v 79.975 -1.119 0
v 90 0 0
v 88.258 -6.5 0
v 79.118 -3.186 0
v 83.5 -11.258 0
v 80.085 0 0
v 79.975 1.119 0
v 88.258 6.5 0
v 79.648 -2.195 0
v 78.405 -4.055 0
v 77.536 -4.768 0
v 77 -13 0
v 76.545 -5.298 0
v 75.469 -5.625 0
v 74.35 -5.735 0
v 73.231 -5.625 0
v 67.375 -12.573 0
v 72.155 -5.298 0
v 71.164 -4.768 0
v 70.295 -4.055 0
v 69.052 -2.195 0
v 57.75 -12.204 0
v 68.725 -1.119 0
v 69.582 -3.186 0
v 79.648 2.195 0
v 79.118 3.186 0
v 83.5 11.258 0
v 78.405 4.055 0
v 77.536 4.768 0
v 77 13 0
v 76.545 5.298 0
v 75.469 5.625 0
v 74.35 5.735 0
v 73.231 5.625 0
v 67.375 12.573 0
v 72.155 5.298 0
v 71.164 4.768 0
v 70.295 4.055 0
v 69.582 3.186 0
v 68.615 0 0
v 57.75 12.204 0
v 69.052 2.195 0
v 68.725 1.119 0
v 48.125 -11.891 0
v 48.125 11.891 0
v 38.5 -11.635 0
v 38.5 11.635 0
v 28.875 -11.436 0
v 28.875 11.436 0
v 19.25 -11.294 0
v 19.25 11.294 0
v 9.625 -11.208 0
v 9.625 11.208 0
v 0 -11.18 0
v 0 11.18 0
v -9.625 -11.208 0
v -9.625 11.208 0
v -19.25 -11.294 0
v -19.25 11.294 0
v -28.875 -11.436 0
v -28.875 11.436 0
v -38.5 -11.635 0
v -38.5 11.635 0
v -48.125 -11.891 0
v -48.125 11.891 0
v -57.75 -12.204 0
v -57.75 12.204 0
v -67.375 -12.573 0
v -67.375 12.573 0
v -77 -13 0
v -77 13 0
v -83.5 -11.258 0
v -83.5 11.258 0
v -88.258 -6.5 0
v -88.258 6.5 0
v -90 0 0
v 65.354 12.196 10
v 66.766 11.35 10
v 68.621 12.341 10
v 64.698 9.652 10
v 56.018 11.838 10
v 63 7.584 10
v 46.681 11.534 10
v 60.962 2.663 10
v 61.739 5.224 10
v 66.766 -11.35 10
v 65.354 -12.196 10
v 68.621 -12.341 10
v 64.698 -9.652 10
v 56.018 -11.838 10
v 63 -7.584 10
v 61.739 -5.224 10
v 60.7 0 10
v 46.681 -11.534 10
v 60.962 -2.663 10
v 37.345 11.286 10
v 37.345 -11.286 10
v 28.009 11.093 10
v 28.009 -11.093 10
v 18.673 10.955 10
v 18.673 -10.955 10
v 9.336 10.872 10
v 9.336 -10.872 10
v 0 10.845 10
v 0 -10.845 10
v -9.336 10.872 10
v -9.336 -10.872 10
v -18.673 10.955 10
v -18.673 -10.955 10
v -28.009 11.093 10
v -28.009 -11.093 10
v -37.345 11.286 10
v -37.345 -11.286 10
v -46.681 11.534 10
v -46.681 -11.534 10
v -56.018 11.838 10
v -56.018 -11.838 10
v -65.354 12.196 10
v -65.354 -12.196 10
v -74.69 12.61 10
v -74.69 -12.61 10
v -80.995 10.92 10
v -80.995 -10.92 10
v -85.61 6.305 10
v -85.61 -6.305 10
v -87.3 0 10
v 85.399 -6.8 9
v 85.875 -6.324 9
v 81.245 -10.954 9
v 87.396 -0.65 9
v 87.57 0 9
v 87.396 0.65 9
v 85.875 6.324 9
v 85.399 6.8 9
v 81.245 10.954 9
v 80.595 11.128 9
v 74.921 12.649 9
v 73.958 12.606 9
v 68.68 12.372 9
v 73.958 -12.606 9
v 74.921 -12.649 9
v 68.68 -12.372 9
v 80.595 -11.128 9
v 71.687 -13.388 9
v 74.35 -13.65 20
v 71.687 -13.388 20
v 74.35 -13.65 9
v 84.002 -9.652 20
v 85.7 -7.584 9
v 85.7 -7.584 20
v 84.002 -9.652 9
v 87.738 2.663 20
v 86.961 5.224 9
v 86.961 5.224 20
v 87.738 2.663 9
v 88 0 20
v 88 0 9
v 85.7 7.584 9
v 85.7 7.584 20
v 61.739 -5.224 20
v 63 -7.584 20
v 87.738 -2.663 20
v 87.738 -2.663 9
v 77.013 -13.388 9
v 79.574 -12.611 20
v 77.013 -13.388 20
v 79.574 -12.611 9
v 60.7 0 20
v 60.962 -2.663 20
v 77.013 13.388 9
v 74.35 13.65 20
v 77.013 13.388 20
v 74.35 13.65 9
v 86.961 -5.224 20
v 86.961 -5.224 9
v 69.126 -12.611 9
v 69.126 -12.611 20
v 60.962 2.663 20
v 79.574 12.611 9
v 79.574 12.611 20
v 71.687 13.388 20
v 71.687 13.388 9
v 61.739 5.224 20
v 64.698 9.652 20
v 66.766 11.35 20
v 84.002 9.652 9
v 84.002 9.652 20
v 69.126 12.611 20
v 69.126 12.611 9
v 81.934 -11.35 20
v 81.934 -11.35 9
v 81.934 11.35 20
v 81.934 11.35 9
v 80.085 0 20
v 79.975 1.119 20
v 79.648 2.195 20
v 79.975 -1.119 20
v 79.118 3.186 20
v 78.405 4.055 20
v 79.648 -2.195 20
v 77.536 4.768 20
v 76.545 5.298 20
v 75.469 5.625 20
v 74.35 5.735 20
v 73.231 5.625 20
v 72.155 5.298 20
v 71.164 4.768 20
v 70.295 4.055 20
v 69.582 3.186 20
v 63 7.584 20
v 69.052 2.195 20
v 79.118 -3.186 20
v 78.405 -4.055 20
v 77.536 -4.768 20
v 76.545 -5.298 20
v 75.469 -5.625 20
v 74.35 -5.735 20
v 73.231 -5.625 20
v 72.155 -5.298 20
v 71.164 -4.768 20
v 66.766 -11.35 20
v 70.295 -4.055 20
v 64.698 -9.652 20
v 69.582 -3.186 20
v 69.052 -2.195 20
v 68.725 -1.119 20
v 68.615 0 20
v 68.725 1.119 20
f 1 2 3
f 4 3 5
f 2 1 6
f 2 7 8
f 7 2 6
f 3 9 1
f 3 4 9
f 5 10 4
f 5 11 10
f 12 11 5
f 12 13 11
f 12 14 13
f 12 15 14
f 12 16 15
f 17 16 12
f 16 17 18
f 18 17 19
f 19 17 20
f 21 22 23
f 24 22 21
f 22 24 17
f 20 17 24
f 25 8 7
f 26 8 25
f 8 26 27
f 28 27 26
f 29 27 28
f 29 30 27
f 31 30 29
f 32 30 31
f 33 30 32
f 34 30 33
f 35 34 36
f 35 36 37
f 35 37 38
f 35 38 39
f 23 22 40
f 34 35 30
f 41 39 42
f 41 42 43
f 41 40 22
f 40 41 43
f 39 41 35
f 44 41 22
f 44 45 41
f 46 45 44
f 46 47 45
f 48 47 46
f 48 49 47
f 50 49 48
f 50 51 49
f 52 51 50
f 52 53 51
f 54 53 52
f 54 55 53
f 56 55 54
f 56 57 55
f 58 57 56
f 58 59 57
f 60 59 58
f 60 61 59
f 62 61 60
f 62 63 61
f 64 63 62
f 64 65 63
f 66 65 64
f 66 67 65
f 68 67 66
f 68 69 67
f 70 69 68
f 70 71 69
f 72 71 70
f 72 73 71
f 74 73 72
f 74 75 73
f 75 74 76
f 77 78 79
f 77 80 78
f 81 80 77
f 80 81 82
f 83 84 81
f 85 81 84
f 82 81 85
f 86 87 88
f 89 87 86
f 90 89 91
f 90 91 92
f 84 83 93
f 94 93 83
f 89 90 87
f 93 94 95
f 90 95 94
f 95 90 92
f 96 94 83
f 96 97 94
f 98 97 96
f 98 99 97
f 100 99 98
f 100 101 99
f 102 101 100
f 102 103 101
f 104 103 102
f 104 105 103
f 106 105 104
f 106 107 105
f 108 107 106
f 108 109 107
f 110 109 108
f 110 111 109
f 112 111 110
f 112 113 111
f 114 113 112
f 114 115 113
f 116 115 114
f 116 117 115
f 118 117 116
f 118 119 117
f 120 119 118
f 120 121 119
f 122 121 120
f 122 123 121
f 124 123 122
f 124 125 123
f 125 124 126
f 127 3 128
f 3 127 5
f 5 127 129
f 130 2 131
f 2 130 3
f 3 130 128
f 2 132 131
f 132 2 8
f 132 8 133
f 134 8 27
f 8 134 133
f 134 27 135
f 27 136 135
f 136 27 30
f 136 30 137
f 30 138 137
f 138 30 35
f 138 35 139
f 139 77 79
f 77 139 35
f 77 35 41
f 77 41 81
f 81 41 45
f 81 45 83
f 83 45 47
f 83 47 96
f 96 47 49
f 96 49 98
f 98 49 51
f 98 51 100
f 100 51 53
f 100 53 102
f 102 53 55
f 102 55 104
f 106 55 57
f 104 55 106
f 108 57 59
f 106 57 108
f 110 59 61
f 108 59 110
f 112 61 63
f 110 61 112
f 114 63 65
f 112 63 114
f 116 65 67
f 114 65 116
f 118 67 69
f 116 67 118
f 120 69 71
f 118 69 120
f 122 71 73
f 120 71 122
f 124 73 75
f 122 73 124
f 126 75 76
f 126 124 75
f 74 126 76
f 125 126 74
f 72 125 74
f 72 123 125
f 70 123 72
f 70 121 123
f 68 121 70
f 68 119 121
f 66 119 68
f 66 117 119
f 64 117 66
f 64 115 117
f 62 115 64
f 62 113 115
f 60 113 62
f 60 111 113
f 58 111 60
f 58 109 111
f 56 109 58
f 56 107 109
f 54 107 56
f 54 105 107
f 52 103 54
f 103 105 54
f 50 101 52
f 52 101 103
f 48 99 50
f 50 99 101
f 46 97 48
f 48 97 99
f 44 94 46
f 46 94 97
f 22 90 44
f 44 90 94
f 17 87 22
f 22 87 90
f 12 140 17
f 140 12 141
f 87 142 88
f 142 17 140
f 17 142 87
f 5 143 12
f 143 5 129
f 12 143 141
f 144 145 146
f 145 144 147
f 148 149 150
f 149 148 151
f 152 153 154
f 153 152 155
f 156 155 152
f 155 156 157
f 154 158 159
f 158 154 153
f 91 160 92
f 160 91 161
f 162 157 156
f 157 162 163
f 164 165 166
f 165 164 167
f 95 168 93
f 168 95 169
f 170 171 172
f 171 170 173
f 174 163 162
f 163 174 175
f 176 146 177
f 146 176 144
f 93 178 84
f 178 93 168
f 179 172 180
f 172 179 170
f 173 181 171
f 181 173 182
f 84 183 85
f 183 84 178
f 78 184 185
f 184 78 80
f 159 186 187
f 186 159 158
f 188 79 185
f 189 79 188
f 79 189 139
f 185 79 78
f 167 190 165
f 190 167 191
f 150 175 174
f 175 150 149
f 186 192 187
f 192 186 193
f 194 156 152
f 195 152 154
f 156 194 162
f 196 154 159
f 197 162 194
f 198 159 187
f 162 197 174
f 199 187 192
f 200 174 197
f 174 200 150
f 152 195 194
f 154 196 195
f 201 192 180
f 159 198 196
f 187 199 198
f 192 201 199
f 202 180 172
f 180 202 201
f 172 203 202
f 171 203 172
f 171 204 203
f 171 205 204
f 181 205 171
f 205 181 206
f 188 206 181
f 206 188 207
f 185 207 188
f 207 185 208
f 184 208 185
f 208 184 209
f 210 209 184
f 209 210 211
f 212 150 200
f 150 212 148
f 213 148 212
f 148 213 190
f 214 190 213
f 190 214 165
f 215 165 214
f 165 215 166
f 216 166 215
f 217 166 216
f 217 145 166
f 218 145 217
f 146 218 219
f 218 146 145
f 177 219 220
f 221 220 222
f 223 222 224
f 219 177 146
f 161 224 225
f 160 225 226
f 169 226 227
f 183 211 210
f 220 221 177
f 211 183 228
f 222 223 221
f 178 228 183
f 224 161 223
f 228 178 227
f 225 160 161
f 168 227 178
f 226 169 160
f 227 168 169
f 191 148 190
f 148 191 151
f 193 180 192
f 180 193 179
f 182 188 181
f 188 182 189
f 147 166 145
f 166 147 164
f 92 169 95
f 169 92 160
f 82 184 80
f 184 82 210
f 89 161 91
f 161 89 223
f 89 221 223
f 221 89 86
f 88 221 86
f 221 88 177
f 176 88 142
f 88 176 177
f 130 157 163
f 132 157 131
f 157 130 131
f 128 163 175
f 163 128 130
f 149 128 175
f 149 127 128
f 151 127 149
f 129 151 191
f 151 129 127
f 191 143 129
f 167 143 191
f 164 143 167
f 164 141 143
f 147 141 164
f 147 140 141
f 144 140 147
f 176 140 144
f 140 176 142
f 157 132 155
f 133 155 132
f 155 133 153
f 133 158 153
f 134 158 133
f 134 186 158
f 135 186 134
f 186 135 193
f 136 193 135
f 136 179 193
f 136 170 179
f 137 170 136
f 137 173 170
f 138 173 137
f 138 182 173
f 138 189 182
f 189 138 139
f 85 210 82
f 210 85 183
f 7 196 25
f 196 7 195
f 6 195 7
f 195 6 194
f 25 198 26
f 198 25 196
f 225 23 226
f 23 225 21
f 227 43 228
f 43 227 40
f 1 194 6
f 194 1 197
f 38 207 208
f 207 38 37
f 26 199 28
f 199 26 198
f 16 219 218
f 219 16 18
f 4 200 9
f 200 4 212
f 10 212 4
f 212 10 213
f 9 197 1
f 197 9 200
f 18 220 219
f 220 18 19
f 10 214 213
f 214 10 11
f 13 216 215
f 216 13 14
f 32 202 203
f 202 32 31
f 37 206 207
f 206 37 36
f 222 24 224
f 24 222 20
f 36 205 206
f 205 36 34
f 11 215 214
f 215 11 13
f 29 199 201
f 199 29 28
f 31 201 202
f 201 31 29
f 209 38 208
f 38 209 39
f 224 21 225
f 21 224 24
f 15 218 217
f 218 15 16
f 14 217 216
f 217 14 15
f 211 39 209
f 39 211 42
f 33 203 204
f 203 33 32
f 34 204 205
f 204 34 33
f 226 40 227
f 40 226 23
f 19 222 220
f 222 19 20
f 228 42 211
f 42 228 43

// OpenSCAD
$fn = 32;

// ----------------------------------------------------------------------
// Handle: 180 x 26 mm grip, 10 mm thick
// ----------------------------------------------------------------------

// --- parameters (mm) ---
length = 180;             // grip length
width = 26;               // grip width
thickness = 10;           // grip thickness
waist = 0.86;             // width factor at the middle
draft = 0.97;             // top face scale of the extrusion
boss_d = 27.3;            // mounting boss diameter
boss_h = 10;              // mounting boss height
boss_hole_d = 11.47;      // screw clearance through the boss
boss_r = 74.35;           // boss centre from the grip centre

/* ergonomic grip outline, closed spline-like polygon in the XY plane */
grip = [[-77, 13], [-67.375, 12.573], [-57.75, 12.204], [-48.125, 11.891], [-38.5, 11.635], [-28.875, 11.436], [-19.25, 11.294], [-9.625, 11.208], [0, 11.18], [9.625, 11.208], [19.25, 11.294], [28.875, 11.436], [38.5, 11.635], [48.125, 11.891], [57.75, 12.204], [67.375, 12.573], [77, 13], [83.5, 11.258], [88.258, 6.5], [90, 0], [88.258, -6.5], [83.5, -11.258], [77, -13], [77, -13], [67.375, -12.573], [57.75, -12.204], [48.125, -11.891], [38.5, -11.635], [28.875, -11.436], [19.25, -11.294], [9.625, -11.208], [0, -11.18], [-9.625, -11.208], [-19.25, -11.294], [-28.875, -11.436], [-38.5, -11.635], [-48.125, -11.891], [-57.75, -12.204], [-67.375, -12.573], [-77, -13], [-83.5, -11.258], [-88.258, -6.5], [-90, 0], [-88.258, 6.5], [-83.5, 11.258], [-77, 13]];

module grip_body() {
  linear_extrude(height = thickness, scale = draft) polygon(grip);
}

module boss_body() {
  /* sunk 1 mm into the grip so the joint overlaps */
  translate([boss_r, 0, thickness - 1]) cylinder(h = boss_h + 1, d = boss_d);
}

difference() {
  union() {
    grip_body();
    boss_body();
  }
  translate([boss_r, 0, -1]) cylinder(h = thickness + boss_h + 2, d = boss_hole_d);
}
